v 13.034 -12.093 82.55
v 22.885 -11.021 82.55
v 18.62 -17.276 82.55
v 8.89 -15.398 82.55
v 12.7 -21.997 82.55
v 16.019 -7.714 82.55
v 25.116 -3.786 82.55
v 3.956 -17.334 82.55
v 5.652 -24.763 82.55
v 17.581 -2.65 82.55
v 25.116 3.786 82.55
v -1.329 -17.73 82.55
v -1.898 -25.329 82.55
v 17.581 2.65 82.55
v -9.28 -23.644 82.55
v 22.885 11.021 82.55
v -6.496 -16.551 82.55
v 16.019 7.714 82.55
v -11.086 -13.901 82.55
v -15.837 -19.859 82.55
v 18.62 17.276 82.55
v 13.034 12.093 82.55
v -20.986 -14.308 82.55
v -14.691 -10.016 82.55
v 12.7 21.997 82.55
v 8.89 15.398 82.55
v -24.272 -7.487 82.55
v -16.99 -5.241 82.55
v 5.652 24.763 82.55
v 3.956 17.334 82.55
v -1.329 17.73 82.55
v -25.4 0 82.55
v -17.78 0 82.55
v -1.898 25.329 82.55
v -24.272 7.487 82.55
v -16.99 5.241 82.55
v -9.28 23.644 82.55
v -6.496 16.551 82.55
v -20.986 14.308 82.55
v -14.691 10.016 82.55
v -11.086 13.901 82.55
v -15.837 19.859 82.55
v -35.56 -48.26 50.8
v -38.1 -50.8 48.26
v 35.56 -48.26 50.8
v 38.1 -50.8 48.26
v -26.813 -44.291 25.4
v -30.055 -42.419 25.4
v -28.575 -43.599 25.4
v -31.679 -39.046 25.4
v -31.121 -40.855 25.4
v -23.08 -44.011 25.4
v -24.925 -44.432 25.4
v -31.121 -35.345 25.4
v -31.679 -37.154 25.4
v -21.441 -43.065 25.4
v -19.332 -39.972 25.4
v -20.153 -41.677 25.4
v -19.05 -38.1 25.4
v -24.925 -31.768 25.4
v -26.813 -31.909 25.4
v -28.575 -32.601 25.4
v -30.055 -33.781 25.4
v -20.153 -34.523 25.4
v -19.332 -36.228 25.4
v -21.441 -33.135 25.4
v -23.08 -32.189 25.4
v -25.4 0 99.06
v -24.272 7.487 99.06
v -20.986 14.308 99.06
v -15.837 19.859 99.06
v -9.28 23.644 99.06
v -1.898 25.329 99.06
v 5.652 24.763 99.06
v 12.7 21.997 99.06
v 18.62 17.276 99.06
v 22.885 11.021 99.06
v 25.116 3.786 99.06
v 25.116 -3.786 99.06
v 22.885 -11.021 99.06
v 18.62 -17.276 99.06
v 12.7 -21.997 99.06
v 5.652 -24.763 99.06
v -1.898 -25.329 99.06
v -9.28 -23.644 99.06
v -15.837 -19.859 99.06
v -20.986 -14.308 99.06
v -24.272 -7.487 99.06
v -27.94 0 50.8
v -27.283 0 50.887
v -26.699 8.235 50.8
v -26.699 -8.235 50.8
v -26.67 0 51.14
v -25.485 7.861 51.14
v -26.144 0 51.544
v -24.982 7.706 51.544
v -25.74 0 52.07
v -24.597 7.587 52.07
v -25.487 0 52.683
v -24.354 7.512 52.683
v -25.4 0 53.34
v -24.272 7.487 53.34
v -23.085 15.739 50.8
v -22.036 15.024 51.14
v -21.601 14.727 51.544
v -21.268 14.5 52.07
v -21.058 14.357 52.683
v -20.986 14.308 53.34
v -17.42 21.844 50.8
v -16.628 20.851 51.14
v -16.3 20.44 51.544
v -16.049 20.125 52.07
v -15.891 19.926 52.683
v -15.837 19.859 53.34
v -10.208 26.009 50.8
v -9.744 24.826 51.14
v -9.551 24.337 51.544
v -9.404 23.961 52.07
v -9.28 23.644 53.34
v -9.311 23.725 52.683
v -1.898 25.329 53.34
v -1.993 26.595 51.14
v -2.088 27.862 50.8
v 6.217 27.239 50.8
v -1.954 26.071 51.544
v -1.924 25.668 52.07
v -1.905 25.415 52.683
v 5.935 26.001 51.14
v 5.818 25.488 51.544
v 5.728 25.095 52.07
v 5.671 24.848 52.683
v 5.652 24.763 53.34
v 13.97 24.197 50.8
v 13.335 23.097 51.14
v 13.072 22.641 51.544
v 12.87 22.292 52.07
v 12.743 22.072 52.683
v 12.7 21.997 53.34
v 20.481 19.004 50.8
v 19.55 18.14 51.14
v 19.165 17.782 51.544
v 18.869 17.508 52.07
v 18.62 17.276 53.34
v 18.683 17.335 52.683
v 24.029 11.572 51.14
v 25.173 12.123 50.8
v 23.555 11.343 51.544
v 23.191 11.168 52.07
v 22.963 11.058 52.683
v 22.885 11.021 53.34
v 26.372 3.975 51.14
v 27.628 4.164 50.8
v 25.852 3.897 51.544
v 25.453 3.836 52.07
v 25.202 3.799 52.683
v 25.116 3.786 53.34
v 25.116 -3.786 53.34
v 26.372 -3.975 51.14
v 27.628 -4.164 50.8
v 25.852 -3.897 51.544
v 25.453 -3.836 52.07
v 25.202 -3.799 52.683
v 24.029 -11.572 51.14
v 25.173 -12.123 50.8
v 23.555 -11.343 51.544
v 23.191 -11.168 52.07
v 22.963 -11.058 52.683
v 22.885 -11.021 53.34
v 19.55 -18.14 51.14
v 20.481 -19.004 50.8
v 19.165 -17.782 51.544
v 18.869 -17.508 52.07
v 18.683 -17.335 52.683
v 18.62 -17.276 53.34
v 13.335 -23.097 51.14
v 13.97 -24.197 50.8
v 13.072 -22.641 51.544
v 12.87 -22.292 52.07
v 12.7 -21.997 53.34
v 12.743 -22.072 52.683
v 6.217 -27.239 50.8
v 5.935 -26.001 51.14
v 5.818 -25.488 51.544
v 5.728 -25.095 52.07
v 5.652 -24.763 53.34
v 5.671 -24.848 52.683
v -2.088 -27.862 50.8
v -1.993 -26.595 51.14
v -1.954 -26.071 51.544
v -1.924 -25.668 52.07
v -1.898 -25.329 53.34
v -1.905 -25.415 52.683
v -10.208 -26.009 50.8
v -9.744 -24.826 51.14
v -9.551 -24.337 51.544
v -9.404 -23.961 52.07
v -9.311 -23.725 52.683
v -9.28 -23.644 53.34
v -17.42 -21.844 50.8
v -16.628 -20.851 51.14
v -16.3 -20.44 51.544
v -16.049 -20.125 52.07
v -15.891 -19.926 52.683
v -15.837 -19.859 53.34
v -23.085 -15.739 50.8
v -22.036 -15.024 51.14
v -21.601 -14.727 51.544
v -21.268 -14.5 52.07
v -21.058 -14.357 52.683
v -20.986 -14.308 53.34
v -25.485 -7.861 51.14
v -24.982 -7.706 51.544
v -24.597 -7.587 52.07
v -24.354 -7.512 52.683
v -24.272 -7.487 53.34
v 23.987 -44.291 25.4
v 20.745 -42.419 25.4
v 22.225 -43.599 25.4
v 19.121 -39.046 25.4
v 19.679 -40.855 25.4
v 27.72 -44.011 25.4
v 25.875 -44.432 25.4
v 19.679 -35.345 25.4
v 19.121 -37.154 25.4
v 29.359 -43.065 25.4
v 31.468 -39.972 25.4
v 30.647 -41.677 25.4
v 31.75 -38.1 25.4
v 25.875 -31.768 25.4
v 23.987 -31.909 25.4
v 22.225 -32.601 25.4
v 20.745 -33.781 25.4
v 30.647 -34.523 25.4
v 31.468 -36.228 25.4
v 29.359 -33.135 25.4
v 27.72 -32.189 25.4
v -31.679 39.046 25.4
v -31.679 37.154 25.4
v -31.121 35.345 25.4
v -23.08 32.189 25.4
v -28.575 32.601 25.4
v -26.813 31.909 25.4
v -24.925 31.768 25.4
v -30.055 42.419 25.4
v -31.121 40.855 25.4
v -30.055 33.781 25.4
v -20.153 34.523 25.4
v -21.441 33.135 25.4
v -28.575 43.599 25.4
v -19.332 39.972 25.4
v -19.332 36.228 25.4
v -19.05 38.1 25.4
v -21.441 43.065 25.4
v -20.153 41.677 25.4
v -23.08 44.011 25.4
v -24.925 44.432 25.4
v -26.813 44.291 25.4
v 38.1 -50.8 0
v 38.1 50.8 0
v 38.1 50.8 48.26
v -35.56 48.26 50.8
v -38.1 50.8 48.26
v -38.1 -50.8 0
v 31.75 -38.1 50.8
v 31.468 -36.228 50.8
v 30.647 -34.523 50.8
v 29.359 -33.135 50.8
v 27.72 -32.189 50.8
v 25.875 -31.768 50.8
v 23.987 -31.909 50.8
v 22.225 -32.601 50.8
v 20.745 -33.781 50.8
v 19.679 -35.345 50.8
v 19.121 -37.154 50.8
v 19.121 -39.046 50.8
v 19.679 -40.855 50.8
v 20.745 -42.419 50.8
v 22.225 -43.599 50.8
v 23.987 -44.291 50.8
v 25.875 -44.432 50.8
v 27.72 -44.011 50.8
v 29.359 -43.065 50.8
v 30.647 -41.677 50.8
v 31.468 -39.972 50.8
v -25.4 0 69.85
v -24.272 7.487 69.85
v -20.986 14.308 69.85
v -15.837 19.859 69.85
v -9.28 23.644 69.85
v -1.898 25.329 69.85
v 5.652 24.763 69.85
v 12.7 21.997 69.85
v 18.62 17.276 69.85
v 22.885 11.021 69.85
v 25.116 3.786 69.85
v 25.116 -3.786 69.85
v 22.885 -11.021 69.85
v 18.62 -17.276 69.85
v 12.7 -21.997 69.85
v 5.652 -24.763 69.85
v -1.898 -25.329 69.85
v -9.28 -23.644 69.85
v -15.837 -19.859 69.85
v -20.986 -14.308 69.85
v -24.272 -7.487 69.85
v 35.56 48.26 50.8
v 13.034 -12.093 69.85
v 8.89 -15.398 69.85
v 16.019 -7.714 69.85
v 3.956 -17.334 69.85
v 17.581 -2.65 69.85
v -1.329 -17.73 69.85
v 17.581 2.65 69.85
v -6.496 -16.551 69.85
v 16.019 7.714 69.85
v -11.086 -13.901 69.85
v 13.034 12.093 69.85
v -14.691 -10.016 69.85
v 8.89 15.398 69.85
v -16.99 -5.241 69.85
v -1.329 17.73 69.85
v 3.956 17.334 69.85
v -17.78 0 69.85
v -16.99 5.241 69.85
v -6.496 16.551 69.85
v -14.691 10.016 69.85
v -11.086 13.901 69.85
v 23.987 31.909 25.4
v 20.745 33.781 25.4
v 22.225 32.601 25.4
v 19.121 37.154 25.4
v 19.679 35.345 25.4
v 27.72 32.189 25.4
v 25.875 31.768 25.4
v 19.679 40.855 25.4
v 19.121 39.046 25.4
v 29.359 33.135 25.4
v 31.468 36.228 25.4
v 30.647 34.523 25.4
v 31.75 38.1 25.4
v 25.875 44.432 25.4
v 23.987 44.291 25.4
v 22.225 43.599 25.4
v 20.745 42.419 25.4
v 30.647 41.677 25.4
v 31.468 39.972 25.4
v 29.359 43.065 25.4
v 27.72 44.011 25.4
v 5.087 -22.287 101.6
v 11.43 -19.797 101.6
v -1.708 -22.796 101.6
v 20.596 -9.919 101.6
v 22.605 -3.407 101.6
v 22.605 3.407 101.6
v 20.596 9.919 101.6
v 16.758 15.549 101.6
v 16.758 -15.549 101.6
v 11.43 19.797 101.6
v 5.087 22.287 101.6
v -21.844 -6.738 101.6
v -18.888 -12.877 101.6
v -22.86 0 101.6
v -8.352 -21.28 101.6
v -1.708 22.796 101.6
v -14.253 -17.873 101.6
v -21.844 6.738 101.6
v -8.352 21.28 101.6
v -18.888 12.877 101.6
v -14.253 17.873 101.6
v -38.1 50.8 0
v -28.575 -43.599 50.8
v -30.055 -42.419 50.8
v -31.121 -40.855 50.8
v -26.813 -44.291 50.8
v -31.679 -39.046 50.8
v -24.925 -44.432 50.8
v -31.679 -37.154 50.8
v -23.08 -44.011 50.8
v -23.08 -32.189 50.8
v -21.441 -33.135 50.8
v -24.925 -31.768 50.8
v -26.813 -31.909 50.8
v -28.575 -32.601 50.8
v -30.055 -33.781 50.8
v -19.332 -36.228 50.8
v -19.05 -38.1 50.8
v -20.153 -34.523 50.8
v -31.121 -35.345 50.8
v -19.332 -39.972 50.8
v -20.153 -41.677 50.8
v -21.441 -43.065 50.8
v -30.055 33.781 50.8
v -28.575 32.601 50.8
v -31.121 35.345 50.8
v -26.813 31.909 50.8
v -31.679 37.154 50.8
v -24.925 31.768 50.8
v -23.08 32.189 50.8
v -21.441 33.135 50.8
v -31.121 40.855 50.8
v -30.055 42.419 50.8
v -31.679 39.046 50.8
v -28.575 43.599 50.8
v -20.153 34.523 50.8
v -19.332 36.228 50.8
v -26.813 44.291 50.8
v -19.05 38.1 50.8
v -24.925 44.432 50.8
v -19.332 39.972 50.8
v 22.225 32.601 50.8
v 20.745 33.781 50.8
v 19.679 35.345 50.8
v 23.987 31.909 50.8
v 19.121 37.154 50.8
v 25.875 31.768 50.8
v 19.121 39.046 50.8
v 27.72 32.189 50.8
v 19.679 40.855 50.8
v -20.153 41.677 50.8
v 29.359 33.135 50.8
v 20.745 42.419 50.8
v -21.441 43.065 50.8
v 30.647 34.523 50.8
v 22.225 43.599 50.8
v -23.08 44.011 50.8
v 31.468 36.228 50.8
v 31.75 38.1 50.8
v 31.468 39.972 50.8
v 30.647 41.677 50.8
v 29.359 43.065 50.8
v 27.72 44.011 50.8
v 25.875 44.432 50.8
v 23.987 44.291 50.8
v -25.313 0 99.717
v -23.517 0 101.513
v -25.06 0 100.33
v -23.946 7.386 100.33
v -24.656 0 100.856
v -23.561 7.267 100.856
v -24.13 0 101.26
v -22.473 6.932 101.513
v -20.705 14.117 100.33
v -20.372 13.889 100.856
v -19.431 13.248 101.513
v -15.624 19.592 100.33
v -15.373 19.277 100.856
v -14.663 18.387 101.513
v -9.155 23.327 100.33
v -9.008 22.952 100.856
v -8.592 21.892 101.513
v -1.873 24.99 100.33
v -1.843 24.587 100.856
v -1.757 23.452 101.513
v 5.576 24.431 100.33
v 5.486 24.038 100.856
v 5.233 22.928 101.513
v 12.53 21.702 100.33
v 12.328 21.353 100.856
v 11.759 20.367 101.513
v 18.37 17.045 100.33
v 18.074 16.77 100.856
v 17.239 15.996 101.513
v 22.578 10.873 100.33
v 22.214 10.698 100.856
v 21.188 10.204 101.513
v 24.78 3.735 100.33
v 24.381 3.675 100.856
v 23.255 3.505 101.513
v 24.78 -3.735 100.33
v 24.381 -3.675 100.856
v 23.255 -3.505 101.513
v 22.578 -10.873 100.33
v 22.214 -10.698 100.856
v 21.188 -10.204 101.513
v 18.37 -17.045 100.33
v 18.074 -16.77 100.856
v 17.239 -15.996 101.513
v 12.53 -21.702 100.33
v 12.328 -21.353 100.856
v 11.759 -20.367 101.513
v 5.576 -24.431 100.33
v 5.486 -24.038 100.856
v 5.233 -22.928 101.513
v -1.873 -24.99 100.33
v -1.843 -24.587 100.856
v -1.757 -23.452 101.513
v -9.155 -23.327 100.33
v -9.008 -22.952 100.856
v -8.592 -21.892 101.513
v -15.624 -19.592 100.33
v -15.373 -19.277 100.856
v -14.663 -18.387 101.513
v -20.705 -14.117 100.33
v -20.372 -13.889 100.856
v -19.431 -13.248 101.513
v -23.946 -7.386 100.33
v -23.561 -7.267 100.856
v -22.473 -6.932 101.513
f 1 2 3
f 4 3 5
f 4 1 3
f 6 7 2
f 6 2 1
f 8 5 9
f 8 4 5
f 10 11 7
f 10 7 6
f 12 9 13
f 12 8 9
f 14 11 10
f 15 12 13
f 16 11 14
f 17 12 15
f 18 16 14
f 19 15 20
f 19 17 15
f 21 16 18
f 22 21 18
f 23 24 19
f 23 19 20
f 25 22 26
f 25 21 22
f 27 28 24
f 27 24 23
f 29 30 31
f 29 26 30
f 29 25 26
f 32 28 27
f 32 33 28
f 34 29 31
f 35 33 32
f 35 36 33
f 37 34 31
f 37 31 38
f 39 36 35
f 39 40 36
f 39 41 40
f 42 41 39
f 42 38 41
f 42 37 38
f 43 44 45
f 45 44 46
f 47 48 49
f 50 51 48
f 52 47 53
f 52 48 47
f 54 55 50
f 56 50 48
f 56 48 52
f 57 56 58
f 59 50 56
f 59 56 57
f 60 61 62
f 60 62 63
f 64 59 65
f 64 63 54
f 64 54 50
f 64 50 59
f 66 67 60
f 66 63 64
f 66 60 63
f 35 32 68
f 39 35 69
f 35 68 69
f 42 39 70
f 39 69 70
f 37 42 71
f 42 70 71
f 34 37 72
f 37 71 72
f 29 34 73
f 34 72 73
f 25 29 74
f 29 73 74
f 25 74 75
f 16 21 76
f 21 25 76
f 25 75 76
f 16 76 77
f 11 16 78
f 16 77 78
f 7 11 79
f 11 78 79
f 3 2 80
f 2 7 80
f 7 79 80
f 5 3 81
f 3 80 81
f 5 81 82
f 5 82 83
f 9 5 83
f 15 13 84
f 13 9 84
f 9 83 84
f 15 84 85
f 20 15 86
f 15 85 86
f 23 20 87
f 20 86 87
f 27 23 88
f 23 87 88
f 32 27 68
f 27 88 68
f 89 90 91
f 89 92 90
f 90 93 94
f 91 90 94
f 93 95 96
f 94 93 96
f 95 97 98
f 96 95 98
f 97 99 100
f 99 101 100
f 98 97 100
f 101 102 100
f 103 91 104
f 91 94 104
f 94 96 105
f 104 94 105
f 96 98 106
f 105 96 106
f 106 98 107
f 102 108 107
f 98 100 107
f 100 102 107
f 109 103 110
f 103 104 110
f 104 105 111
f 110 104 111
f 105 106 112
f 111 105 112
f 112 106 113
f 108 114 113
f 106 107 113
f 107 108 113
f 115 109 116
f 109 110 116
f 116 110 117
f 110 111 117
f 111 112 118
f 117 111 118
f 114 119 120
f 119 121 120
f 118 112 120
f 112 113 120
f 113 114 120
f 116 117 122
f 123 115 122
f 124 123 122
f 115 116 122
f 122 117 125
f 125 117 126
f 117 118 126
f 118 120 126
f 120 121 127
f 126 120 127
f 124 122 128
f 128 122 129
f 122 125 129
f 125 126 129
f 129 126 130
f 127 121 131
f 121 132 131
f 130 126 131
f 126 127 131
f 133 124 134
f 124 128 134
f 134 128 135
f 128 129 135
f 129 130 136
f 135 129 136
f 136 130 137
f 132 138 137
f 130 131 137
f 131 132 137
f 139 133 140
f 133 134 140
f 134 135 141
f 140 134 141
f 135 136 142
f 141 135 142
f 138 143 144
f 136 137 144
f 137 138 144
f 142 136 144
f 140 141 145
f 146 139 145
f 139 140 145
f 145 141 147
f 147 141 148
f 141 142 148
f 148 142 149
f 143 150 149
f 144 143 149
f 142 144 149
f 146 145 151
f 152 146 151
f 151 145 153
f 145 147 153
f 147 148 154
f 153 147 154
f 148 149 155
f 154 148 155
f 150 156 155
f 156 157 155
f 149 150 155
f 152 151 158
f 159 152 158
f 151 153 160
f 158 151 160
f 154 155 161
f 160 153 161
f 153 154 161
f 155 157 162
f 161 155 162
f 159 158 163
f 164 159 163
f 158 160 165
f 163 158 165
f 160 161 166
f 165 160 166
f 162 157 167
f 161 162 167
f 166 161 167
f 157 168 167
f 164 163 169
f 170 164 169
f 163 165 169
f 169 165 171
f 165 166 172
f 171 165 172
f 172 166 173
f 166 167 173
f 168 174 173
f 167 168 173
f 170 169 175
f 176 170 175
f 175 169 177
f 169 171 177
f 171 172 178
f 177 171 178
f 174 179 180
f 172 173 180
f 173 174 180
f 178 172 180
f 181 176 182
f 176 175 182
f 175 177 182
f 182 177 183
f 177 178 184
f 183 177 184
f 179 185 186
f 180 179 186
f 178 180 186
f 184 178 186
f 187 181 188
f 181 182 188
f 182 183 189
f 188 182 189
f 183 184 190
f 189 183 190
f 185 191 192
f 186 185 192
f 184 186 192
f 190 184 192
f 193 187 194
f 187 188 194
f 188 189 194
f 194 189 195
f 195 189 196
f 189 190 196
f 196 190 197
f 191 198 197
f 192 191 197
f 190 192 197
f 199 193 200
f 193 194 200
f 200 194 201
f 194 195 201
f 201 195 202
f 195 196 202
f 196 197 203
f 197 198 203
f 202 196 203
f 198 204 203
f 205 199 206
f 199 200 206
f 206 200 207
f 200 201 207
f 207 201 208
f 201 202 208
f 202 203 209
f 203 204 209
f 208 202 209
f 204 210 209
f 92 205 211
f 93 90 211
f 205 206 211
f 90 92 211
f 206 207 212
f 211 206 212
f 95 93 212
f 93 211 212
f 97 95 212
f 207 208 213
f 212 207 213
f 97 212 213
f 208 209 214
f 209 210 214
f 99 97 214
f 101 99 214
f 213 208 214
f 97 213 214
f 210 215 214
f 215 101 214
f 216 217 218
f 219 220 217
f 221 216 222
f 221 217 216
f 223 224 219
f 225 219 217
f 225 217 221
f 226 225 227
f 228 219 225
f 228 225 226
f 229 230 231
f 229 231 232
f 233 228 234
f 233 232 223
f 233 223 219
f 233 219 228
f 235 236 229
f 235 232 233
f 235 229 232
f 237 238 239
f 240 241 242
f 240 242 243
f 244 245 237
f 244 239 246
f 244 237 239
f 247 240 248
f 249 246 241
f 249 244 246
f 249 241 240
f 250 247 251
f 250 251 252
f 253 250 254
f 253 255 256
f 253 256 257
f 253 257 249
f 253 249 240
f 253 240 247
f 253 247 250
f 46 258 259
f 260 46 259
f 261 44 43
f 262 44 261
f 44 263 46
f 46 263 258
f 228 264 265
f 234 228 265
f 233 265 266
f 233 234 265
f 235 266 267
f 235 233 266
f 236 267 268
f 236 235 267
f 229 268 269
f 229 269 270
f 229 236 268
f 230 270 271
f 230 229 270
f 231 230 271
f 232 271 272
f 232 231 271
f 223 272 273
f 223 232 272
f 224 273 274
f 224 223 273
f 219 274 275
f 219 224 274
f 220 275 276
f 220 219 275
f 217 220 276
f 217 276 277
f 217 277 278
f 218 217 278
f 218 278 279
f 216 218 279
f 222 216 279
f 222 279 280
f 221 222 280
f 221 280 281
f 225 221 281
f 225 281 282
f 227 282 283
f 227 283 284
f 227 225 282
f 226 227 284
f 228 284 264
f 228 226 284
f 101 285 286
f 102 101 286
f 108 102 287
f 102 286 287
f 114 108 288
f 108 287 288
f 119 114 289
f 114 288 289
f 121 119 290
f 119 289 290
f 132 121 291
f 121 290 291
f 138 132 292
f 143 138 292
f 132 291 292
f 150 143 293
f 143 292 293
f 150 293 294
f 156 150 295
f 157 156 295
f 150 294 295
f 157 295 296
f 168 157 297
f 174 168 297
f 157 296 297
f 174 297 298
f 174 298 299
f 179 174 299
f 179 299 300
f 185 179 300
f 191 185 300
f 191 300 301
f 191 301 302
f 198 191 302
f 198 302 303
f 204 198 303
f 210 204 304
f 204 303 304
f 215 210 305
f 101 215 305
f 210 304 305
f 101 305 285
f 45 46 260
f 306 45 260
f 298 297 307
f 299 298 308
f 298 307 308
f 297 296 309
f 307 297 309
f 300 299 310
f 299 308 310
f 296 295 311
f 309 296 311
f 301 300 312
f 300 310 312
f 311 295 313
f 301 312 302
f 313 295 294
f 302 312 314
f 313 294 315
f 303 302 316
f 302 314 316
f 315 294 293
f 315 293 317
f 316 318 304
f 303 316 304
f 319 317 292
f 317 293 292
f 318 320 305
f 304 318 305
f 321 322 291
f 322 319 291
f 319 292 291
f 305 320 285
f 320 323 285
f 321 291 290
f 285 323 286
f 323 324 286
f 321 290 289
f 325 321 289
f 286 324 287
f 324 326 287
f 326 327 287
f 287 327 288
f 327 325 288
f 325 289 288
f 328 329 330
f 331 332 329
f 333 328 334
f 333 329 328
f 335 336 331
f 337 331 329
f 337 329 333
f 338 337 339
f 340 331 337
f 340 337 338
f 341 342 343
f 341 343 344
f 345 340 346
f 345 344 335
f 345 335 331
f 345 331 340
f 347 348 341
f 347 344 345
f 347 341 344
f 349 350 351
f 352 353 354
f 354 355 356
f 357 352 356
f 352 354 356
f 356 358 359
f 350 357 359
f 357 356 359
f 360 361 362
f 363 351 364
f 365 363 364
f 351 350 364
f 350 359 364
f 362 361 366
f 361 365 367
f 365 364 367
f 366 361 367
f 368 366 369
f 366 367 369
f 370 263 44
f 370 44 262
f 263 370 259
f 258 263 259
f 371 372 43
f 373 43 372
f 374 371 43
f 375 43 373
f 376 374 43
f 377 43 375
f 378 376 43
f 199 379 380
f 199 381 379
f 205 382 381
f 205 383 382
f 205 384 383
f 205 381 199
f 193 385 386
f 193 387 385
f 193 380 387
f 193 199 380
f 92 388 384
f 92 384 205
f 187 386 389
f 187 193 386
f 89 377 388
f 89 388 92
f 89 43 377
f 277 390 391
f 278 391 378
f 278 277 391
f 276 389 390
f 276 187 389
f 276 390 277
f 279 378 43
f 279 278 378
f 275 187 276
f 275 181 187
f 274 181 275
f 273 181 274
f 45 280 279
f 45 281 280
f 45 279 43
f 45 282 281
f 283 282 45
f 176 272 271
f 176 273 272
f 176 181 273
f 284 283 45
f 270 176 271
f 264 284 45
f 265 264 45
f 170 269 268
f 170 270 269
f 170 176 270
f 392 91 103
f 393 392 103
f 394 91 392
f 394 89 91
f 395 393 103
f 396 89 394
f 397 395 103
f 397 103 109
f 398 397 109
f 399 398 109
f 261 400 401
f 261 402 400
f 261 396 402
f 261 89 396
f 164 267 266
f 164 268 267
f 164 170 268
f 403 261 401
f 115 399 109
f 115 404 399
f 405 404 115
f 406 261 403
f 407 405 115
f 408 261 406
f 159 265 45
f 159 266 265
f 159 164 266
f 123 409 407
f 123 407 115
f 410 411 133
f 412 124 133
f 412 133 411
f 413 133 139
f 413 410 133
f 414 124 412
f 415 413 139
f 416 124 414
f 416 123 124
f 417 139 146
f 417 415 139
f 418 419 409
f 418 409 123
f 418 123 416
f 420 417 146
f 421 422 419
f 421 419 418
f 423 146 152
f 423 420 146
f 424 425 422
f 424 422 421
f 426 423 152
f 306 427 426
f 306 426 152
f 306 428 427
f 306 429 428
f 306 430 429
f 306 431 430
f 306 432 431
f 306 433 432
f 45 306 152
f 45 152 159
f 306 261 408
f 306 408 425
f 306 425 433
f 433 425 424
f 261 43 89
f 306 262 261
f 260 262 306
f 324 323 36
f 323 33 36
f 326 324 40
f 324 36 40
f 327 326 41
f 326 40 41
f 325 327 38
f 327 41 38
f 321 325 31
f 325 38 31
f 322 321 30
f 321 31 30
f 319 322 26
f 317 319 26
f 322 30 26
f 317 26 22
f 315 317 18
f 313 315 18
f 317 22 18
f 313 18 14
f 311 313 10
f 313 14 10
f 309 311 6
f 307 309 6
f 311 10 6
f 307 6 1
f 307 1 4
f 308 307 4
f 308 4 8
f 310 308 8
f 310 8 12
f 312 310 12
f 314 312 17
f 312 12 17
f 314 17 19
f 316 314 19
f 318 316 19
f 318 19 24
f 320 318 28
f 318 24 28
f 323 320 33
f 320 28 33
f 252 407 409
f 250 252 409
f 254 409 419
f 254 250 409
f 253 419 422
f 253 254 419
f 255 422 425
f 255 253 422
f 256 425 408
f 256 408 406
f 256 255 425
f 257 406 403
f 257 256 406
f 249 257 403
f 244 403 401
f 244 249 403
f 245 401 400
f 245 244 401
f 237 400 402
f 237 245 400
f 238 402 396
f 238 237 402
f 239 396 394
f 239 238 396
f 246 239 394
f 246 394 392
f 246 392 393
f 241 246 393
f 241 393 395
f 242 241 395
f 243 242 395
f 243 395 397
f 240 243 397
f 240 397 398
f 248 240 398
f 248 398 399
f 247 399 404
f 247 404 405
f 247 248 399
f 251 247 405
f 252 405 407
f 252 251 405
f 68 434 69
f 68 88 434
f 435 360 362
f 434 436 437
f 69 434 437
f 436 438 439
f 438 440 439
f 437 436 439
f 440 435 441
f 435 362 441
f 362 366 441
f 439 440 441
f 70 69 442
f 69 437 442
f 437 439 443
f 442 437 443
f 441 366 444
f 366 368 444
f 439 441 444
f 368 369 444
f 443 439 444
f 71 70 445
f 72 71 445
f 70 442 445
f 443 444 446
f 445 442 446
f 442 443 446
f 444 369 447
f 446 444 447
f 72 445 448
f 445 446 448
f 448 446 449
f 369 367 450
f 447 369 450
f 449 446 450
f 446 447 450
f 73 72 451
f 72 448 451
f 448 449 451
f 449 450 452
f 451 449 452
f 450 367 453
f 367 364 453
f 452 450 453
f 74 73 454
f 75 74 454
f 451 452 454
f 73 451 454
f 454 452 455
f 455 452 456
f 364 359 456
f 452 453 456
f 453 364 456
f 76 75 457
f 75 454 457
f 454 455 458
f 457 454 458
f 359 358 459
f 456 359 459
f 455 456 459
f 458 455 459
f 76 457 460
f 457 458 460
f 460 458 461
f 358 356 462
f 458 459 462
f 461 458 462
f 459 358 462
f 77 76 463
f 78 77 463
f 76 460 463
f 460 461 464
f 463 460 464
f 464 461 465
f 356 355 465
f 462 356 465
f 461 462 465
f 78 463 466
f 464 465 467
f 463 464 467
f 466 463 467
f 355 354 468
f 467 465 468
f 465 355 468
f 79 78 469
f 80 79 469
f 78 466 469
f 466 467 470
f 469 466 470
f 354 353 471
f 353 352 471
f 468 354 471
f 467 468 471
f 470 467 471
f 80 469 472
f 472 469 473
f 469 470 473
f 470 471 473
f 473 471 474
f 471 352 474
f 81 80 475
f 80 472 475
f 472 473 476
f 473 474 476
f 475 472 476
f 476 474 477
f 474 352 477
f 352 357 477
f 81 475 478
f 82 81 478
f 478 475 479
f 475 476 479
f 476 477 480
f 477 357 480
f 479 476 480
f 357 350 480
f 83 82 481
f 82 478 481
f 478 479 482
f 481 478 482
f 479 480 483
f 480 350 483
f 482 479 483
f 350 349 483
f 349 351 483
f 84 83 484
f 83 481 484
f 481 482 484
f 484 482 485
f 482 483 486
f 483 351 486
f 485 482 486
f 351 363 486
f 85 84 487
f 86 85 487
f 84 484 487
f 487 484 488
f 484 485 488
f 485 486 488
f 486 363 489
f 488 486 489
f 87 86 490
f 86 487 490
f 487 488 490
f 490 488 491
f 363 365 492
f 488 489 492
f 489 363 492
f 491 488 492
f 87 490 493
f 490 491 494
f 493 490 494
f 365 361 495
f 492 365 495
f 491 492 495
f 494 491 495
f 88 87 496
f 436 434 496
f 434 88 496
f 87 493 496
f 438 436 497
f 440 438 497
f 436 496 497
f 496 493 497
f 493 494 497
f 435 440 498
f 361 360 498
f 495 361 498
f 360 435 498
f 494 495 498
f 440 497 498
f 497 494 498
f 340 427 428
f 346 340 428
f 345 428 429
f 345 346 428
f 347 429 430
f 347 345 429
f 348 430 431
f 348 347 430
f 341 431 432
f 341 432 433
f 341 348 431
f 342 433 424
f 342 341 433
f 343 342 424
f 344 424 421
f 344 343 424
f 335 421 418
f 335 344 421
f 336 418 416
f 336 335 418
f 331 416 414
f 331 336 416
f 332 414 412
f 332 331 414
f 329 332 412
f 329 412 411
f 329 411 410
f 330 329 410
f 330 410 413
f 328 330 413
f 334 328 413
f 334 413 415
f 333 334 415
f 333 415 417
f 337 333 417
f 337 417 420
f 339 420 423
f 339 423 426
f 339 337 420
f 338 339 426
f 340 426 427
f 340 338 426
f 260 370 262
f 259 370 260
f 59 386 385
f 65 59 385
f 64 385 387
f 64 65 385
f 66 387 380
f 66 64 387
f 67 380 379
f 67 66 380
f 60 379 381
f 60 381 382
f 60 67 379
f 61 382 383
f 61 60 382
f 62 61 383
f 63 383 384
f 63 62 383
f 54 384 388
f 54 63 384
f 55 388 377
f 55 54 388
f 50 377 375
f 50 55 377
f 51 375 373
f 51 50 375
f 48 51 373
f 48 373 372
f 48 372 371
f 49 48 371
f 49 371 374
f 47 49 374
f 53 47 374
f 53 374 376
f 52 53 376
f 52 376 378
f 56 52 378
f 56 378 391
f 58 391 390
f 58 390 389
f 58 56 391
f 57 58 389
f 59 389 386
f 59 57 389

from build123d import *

# Parameters (mm, degrees)
F0_W      = 76.2
F0_H      = 101.6
F1_DEPTH  = 25.4
F2_W      = 76.2
F2_H      = 101.6
F2_R      = 6.35
F3_DEPTH  = 25.4
F4_W      = 25.4
F4_H      = 50.8
F6_W      = 18.3004425924
F6_H      = 12.7
F8_R      = 2.54
F9_SIZE   = 2.54
F10_DEPTH = 25.4


with BuildPart() as f1:
    # F0 (on Top) → F1 (new body)
    with BuildSketch(Plane.XY):
        Rectangle(F0_W, F0_H)
    extrude(amount=F1_DEPTH)

    # F2 (on face) → F3 (join)
    with BuildSketch(Plane.XY.offset(25.4)):
        Rectangle(F2_W, F2_H)
        with Locations((-25.4, -38.1)):
            Circle(F2_R, mode=Mode.SUBTRACT)
        with Locations((25.4, -38.1)):
            Circle(F2_R, mode=Mode.SUBTRACT)
        with Locations((-25.4, 38.1)):
            Circle(F2_R, mode=Mode.SUBTRACT)
        with Locations((25.4, 38.1)):
            Circle(F2_R, mode=Mode.SUBTRACT)
        with Locations((-25.4, 38.1)):
            Circle(F2_R)
    extrude(amount=F3_DEPTH)

    # F4 (on Front) → F5 (revolve)
    with BuildSketch(Plane.XZ):
        with Locations((-12.7, 76.2)):
            Rectangle(F4_W, F4_H)
    revolve(axis=Axis((0, 0, 76.2), (0, 0, -1)))

    # F6 (on Front) → F7 (revolve, cut)
    with BuildSketch(Plane.XZ):
        with Locations((-26.9302212962, 76.2)):
            Rectangle(F6_W, F6_H)
    revolve(axis=Axis((0, 0, 101.6), (0, 0, -1)), mode=Mode.SUBTRACT)

    # F8
    f8_edges = [f1.edges().sort_by_distance(p)[0] for p in [
        (25.4, 0, 101.6),
        (25.4, 0, 50.8),
    ]]
    fillet(f8_edges, radius=F8_R)

    # F9
    f9_edges = [f1.edges().sort_by_distance(p)[0] for p in [
        (0, -50.8, 50.8),
        (38.1, 0, 50.8),
        (0, 50.8, 50.8),
        (-38.1, 0, 50.8),
    ]]
    chamfer(f9_edges, length=F9_SIZE)

    # F2 (on face) → F10 (cut)
    with BuildSketch(Plane.XY.offset(25.4)):
        with Locations((-25.4, 38.1)):
            Circle(F2_R)
        with Locations((25.4, 38.1)):
            Circle(F2_R)
        with Locations((-25.4, -38.1)):
            Circle(F2_R)
        with Locations((25.4, -38.1)):
            Circle(F2_R)
    extrude(amount=F10_DEPTH, mode=Mode.SUBTRACT)


solid = f1.part
